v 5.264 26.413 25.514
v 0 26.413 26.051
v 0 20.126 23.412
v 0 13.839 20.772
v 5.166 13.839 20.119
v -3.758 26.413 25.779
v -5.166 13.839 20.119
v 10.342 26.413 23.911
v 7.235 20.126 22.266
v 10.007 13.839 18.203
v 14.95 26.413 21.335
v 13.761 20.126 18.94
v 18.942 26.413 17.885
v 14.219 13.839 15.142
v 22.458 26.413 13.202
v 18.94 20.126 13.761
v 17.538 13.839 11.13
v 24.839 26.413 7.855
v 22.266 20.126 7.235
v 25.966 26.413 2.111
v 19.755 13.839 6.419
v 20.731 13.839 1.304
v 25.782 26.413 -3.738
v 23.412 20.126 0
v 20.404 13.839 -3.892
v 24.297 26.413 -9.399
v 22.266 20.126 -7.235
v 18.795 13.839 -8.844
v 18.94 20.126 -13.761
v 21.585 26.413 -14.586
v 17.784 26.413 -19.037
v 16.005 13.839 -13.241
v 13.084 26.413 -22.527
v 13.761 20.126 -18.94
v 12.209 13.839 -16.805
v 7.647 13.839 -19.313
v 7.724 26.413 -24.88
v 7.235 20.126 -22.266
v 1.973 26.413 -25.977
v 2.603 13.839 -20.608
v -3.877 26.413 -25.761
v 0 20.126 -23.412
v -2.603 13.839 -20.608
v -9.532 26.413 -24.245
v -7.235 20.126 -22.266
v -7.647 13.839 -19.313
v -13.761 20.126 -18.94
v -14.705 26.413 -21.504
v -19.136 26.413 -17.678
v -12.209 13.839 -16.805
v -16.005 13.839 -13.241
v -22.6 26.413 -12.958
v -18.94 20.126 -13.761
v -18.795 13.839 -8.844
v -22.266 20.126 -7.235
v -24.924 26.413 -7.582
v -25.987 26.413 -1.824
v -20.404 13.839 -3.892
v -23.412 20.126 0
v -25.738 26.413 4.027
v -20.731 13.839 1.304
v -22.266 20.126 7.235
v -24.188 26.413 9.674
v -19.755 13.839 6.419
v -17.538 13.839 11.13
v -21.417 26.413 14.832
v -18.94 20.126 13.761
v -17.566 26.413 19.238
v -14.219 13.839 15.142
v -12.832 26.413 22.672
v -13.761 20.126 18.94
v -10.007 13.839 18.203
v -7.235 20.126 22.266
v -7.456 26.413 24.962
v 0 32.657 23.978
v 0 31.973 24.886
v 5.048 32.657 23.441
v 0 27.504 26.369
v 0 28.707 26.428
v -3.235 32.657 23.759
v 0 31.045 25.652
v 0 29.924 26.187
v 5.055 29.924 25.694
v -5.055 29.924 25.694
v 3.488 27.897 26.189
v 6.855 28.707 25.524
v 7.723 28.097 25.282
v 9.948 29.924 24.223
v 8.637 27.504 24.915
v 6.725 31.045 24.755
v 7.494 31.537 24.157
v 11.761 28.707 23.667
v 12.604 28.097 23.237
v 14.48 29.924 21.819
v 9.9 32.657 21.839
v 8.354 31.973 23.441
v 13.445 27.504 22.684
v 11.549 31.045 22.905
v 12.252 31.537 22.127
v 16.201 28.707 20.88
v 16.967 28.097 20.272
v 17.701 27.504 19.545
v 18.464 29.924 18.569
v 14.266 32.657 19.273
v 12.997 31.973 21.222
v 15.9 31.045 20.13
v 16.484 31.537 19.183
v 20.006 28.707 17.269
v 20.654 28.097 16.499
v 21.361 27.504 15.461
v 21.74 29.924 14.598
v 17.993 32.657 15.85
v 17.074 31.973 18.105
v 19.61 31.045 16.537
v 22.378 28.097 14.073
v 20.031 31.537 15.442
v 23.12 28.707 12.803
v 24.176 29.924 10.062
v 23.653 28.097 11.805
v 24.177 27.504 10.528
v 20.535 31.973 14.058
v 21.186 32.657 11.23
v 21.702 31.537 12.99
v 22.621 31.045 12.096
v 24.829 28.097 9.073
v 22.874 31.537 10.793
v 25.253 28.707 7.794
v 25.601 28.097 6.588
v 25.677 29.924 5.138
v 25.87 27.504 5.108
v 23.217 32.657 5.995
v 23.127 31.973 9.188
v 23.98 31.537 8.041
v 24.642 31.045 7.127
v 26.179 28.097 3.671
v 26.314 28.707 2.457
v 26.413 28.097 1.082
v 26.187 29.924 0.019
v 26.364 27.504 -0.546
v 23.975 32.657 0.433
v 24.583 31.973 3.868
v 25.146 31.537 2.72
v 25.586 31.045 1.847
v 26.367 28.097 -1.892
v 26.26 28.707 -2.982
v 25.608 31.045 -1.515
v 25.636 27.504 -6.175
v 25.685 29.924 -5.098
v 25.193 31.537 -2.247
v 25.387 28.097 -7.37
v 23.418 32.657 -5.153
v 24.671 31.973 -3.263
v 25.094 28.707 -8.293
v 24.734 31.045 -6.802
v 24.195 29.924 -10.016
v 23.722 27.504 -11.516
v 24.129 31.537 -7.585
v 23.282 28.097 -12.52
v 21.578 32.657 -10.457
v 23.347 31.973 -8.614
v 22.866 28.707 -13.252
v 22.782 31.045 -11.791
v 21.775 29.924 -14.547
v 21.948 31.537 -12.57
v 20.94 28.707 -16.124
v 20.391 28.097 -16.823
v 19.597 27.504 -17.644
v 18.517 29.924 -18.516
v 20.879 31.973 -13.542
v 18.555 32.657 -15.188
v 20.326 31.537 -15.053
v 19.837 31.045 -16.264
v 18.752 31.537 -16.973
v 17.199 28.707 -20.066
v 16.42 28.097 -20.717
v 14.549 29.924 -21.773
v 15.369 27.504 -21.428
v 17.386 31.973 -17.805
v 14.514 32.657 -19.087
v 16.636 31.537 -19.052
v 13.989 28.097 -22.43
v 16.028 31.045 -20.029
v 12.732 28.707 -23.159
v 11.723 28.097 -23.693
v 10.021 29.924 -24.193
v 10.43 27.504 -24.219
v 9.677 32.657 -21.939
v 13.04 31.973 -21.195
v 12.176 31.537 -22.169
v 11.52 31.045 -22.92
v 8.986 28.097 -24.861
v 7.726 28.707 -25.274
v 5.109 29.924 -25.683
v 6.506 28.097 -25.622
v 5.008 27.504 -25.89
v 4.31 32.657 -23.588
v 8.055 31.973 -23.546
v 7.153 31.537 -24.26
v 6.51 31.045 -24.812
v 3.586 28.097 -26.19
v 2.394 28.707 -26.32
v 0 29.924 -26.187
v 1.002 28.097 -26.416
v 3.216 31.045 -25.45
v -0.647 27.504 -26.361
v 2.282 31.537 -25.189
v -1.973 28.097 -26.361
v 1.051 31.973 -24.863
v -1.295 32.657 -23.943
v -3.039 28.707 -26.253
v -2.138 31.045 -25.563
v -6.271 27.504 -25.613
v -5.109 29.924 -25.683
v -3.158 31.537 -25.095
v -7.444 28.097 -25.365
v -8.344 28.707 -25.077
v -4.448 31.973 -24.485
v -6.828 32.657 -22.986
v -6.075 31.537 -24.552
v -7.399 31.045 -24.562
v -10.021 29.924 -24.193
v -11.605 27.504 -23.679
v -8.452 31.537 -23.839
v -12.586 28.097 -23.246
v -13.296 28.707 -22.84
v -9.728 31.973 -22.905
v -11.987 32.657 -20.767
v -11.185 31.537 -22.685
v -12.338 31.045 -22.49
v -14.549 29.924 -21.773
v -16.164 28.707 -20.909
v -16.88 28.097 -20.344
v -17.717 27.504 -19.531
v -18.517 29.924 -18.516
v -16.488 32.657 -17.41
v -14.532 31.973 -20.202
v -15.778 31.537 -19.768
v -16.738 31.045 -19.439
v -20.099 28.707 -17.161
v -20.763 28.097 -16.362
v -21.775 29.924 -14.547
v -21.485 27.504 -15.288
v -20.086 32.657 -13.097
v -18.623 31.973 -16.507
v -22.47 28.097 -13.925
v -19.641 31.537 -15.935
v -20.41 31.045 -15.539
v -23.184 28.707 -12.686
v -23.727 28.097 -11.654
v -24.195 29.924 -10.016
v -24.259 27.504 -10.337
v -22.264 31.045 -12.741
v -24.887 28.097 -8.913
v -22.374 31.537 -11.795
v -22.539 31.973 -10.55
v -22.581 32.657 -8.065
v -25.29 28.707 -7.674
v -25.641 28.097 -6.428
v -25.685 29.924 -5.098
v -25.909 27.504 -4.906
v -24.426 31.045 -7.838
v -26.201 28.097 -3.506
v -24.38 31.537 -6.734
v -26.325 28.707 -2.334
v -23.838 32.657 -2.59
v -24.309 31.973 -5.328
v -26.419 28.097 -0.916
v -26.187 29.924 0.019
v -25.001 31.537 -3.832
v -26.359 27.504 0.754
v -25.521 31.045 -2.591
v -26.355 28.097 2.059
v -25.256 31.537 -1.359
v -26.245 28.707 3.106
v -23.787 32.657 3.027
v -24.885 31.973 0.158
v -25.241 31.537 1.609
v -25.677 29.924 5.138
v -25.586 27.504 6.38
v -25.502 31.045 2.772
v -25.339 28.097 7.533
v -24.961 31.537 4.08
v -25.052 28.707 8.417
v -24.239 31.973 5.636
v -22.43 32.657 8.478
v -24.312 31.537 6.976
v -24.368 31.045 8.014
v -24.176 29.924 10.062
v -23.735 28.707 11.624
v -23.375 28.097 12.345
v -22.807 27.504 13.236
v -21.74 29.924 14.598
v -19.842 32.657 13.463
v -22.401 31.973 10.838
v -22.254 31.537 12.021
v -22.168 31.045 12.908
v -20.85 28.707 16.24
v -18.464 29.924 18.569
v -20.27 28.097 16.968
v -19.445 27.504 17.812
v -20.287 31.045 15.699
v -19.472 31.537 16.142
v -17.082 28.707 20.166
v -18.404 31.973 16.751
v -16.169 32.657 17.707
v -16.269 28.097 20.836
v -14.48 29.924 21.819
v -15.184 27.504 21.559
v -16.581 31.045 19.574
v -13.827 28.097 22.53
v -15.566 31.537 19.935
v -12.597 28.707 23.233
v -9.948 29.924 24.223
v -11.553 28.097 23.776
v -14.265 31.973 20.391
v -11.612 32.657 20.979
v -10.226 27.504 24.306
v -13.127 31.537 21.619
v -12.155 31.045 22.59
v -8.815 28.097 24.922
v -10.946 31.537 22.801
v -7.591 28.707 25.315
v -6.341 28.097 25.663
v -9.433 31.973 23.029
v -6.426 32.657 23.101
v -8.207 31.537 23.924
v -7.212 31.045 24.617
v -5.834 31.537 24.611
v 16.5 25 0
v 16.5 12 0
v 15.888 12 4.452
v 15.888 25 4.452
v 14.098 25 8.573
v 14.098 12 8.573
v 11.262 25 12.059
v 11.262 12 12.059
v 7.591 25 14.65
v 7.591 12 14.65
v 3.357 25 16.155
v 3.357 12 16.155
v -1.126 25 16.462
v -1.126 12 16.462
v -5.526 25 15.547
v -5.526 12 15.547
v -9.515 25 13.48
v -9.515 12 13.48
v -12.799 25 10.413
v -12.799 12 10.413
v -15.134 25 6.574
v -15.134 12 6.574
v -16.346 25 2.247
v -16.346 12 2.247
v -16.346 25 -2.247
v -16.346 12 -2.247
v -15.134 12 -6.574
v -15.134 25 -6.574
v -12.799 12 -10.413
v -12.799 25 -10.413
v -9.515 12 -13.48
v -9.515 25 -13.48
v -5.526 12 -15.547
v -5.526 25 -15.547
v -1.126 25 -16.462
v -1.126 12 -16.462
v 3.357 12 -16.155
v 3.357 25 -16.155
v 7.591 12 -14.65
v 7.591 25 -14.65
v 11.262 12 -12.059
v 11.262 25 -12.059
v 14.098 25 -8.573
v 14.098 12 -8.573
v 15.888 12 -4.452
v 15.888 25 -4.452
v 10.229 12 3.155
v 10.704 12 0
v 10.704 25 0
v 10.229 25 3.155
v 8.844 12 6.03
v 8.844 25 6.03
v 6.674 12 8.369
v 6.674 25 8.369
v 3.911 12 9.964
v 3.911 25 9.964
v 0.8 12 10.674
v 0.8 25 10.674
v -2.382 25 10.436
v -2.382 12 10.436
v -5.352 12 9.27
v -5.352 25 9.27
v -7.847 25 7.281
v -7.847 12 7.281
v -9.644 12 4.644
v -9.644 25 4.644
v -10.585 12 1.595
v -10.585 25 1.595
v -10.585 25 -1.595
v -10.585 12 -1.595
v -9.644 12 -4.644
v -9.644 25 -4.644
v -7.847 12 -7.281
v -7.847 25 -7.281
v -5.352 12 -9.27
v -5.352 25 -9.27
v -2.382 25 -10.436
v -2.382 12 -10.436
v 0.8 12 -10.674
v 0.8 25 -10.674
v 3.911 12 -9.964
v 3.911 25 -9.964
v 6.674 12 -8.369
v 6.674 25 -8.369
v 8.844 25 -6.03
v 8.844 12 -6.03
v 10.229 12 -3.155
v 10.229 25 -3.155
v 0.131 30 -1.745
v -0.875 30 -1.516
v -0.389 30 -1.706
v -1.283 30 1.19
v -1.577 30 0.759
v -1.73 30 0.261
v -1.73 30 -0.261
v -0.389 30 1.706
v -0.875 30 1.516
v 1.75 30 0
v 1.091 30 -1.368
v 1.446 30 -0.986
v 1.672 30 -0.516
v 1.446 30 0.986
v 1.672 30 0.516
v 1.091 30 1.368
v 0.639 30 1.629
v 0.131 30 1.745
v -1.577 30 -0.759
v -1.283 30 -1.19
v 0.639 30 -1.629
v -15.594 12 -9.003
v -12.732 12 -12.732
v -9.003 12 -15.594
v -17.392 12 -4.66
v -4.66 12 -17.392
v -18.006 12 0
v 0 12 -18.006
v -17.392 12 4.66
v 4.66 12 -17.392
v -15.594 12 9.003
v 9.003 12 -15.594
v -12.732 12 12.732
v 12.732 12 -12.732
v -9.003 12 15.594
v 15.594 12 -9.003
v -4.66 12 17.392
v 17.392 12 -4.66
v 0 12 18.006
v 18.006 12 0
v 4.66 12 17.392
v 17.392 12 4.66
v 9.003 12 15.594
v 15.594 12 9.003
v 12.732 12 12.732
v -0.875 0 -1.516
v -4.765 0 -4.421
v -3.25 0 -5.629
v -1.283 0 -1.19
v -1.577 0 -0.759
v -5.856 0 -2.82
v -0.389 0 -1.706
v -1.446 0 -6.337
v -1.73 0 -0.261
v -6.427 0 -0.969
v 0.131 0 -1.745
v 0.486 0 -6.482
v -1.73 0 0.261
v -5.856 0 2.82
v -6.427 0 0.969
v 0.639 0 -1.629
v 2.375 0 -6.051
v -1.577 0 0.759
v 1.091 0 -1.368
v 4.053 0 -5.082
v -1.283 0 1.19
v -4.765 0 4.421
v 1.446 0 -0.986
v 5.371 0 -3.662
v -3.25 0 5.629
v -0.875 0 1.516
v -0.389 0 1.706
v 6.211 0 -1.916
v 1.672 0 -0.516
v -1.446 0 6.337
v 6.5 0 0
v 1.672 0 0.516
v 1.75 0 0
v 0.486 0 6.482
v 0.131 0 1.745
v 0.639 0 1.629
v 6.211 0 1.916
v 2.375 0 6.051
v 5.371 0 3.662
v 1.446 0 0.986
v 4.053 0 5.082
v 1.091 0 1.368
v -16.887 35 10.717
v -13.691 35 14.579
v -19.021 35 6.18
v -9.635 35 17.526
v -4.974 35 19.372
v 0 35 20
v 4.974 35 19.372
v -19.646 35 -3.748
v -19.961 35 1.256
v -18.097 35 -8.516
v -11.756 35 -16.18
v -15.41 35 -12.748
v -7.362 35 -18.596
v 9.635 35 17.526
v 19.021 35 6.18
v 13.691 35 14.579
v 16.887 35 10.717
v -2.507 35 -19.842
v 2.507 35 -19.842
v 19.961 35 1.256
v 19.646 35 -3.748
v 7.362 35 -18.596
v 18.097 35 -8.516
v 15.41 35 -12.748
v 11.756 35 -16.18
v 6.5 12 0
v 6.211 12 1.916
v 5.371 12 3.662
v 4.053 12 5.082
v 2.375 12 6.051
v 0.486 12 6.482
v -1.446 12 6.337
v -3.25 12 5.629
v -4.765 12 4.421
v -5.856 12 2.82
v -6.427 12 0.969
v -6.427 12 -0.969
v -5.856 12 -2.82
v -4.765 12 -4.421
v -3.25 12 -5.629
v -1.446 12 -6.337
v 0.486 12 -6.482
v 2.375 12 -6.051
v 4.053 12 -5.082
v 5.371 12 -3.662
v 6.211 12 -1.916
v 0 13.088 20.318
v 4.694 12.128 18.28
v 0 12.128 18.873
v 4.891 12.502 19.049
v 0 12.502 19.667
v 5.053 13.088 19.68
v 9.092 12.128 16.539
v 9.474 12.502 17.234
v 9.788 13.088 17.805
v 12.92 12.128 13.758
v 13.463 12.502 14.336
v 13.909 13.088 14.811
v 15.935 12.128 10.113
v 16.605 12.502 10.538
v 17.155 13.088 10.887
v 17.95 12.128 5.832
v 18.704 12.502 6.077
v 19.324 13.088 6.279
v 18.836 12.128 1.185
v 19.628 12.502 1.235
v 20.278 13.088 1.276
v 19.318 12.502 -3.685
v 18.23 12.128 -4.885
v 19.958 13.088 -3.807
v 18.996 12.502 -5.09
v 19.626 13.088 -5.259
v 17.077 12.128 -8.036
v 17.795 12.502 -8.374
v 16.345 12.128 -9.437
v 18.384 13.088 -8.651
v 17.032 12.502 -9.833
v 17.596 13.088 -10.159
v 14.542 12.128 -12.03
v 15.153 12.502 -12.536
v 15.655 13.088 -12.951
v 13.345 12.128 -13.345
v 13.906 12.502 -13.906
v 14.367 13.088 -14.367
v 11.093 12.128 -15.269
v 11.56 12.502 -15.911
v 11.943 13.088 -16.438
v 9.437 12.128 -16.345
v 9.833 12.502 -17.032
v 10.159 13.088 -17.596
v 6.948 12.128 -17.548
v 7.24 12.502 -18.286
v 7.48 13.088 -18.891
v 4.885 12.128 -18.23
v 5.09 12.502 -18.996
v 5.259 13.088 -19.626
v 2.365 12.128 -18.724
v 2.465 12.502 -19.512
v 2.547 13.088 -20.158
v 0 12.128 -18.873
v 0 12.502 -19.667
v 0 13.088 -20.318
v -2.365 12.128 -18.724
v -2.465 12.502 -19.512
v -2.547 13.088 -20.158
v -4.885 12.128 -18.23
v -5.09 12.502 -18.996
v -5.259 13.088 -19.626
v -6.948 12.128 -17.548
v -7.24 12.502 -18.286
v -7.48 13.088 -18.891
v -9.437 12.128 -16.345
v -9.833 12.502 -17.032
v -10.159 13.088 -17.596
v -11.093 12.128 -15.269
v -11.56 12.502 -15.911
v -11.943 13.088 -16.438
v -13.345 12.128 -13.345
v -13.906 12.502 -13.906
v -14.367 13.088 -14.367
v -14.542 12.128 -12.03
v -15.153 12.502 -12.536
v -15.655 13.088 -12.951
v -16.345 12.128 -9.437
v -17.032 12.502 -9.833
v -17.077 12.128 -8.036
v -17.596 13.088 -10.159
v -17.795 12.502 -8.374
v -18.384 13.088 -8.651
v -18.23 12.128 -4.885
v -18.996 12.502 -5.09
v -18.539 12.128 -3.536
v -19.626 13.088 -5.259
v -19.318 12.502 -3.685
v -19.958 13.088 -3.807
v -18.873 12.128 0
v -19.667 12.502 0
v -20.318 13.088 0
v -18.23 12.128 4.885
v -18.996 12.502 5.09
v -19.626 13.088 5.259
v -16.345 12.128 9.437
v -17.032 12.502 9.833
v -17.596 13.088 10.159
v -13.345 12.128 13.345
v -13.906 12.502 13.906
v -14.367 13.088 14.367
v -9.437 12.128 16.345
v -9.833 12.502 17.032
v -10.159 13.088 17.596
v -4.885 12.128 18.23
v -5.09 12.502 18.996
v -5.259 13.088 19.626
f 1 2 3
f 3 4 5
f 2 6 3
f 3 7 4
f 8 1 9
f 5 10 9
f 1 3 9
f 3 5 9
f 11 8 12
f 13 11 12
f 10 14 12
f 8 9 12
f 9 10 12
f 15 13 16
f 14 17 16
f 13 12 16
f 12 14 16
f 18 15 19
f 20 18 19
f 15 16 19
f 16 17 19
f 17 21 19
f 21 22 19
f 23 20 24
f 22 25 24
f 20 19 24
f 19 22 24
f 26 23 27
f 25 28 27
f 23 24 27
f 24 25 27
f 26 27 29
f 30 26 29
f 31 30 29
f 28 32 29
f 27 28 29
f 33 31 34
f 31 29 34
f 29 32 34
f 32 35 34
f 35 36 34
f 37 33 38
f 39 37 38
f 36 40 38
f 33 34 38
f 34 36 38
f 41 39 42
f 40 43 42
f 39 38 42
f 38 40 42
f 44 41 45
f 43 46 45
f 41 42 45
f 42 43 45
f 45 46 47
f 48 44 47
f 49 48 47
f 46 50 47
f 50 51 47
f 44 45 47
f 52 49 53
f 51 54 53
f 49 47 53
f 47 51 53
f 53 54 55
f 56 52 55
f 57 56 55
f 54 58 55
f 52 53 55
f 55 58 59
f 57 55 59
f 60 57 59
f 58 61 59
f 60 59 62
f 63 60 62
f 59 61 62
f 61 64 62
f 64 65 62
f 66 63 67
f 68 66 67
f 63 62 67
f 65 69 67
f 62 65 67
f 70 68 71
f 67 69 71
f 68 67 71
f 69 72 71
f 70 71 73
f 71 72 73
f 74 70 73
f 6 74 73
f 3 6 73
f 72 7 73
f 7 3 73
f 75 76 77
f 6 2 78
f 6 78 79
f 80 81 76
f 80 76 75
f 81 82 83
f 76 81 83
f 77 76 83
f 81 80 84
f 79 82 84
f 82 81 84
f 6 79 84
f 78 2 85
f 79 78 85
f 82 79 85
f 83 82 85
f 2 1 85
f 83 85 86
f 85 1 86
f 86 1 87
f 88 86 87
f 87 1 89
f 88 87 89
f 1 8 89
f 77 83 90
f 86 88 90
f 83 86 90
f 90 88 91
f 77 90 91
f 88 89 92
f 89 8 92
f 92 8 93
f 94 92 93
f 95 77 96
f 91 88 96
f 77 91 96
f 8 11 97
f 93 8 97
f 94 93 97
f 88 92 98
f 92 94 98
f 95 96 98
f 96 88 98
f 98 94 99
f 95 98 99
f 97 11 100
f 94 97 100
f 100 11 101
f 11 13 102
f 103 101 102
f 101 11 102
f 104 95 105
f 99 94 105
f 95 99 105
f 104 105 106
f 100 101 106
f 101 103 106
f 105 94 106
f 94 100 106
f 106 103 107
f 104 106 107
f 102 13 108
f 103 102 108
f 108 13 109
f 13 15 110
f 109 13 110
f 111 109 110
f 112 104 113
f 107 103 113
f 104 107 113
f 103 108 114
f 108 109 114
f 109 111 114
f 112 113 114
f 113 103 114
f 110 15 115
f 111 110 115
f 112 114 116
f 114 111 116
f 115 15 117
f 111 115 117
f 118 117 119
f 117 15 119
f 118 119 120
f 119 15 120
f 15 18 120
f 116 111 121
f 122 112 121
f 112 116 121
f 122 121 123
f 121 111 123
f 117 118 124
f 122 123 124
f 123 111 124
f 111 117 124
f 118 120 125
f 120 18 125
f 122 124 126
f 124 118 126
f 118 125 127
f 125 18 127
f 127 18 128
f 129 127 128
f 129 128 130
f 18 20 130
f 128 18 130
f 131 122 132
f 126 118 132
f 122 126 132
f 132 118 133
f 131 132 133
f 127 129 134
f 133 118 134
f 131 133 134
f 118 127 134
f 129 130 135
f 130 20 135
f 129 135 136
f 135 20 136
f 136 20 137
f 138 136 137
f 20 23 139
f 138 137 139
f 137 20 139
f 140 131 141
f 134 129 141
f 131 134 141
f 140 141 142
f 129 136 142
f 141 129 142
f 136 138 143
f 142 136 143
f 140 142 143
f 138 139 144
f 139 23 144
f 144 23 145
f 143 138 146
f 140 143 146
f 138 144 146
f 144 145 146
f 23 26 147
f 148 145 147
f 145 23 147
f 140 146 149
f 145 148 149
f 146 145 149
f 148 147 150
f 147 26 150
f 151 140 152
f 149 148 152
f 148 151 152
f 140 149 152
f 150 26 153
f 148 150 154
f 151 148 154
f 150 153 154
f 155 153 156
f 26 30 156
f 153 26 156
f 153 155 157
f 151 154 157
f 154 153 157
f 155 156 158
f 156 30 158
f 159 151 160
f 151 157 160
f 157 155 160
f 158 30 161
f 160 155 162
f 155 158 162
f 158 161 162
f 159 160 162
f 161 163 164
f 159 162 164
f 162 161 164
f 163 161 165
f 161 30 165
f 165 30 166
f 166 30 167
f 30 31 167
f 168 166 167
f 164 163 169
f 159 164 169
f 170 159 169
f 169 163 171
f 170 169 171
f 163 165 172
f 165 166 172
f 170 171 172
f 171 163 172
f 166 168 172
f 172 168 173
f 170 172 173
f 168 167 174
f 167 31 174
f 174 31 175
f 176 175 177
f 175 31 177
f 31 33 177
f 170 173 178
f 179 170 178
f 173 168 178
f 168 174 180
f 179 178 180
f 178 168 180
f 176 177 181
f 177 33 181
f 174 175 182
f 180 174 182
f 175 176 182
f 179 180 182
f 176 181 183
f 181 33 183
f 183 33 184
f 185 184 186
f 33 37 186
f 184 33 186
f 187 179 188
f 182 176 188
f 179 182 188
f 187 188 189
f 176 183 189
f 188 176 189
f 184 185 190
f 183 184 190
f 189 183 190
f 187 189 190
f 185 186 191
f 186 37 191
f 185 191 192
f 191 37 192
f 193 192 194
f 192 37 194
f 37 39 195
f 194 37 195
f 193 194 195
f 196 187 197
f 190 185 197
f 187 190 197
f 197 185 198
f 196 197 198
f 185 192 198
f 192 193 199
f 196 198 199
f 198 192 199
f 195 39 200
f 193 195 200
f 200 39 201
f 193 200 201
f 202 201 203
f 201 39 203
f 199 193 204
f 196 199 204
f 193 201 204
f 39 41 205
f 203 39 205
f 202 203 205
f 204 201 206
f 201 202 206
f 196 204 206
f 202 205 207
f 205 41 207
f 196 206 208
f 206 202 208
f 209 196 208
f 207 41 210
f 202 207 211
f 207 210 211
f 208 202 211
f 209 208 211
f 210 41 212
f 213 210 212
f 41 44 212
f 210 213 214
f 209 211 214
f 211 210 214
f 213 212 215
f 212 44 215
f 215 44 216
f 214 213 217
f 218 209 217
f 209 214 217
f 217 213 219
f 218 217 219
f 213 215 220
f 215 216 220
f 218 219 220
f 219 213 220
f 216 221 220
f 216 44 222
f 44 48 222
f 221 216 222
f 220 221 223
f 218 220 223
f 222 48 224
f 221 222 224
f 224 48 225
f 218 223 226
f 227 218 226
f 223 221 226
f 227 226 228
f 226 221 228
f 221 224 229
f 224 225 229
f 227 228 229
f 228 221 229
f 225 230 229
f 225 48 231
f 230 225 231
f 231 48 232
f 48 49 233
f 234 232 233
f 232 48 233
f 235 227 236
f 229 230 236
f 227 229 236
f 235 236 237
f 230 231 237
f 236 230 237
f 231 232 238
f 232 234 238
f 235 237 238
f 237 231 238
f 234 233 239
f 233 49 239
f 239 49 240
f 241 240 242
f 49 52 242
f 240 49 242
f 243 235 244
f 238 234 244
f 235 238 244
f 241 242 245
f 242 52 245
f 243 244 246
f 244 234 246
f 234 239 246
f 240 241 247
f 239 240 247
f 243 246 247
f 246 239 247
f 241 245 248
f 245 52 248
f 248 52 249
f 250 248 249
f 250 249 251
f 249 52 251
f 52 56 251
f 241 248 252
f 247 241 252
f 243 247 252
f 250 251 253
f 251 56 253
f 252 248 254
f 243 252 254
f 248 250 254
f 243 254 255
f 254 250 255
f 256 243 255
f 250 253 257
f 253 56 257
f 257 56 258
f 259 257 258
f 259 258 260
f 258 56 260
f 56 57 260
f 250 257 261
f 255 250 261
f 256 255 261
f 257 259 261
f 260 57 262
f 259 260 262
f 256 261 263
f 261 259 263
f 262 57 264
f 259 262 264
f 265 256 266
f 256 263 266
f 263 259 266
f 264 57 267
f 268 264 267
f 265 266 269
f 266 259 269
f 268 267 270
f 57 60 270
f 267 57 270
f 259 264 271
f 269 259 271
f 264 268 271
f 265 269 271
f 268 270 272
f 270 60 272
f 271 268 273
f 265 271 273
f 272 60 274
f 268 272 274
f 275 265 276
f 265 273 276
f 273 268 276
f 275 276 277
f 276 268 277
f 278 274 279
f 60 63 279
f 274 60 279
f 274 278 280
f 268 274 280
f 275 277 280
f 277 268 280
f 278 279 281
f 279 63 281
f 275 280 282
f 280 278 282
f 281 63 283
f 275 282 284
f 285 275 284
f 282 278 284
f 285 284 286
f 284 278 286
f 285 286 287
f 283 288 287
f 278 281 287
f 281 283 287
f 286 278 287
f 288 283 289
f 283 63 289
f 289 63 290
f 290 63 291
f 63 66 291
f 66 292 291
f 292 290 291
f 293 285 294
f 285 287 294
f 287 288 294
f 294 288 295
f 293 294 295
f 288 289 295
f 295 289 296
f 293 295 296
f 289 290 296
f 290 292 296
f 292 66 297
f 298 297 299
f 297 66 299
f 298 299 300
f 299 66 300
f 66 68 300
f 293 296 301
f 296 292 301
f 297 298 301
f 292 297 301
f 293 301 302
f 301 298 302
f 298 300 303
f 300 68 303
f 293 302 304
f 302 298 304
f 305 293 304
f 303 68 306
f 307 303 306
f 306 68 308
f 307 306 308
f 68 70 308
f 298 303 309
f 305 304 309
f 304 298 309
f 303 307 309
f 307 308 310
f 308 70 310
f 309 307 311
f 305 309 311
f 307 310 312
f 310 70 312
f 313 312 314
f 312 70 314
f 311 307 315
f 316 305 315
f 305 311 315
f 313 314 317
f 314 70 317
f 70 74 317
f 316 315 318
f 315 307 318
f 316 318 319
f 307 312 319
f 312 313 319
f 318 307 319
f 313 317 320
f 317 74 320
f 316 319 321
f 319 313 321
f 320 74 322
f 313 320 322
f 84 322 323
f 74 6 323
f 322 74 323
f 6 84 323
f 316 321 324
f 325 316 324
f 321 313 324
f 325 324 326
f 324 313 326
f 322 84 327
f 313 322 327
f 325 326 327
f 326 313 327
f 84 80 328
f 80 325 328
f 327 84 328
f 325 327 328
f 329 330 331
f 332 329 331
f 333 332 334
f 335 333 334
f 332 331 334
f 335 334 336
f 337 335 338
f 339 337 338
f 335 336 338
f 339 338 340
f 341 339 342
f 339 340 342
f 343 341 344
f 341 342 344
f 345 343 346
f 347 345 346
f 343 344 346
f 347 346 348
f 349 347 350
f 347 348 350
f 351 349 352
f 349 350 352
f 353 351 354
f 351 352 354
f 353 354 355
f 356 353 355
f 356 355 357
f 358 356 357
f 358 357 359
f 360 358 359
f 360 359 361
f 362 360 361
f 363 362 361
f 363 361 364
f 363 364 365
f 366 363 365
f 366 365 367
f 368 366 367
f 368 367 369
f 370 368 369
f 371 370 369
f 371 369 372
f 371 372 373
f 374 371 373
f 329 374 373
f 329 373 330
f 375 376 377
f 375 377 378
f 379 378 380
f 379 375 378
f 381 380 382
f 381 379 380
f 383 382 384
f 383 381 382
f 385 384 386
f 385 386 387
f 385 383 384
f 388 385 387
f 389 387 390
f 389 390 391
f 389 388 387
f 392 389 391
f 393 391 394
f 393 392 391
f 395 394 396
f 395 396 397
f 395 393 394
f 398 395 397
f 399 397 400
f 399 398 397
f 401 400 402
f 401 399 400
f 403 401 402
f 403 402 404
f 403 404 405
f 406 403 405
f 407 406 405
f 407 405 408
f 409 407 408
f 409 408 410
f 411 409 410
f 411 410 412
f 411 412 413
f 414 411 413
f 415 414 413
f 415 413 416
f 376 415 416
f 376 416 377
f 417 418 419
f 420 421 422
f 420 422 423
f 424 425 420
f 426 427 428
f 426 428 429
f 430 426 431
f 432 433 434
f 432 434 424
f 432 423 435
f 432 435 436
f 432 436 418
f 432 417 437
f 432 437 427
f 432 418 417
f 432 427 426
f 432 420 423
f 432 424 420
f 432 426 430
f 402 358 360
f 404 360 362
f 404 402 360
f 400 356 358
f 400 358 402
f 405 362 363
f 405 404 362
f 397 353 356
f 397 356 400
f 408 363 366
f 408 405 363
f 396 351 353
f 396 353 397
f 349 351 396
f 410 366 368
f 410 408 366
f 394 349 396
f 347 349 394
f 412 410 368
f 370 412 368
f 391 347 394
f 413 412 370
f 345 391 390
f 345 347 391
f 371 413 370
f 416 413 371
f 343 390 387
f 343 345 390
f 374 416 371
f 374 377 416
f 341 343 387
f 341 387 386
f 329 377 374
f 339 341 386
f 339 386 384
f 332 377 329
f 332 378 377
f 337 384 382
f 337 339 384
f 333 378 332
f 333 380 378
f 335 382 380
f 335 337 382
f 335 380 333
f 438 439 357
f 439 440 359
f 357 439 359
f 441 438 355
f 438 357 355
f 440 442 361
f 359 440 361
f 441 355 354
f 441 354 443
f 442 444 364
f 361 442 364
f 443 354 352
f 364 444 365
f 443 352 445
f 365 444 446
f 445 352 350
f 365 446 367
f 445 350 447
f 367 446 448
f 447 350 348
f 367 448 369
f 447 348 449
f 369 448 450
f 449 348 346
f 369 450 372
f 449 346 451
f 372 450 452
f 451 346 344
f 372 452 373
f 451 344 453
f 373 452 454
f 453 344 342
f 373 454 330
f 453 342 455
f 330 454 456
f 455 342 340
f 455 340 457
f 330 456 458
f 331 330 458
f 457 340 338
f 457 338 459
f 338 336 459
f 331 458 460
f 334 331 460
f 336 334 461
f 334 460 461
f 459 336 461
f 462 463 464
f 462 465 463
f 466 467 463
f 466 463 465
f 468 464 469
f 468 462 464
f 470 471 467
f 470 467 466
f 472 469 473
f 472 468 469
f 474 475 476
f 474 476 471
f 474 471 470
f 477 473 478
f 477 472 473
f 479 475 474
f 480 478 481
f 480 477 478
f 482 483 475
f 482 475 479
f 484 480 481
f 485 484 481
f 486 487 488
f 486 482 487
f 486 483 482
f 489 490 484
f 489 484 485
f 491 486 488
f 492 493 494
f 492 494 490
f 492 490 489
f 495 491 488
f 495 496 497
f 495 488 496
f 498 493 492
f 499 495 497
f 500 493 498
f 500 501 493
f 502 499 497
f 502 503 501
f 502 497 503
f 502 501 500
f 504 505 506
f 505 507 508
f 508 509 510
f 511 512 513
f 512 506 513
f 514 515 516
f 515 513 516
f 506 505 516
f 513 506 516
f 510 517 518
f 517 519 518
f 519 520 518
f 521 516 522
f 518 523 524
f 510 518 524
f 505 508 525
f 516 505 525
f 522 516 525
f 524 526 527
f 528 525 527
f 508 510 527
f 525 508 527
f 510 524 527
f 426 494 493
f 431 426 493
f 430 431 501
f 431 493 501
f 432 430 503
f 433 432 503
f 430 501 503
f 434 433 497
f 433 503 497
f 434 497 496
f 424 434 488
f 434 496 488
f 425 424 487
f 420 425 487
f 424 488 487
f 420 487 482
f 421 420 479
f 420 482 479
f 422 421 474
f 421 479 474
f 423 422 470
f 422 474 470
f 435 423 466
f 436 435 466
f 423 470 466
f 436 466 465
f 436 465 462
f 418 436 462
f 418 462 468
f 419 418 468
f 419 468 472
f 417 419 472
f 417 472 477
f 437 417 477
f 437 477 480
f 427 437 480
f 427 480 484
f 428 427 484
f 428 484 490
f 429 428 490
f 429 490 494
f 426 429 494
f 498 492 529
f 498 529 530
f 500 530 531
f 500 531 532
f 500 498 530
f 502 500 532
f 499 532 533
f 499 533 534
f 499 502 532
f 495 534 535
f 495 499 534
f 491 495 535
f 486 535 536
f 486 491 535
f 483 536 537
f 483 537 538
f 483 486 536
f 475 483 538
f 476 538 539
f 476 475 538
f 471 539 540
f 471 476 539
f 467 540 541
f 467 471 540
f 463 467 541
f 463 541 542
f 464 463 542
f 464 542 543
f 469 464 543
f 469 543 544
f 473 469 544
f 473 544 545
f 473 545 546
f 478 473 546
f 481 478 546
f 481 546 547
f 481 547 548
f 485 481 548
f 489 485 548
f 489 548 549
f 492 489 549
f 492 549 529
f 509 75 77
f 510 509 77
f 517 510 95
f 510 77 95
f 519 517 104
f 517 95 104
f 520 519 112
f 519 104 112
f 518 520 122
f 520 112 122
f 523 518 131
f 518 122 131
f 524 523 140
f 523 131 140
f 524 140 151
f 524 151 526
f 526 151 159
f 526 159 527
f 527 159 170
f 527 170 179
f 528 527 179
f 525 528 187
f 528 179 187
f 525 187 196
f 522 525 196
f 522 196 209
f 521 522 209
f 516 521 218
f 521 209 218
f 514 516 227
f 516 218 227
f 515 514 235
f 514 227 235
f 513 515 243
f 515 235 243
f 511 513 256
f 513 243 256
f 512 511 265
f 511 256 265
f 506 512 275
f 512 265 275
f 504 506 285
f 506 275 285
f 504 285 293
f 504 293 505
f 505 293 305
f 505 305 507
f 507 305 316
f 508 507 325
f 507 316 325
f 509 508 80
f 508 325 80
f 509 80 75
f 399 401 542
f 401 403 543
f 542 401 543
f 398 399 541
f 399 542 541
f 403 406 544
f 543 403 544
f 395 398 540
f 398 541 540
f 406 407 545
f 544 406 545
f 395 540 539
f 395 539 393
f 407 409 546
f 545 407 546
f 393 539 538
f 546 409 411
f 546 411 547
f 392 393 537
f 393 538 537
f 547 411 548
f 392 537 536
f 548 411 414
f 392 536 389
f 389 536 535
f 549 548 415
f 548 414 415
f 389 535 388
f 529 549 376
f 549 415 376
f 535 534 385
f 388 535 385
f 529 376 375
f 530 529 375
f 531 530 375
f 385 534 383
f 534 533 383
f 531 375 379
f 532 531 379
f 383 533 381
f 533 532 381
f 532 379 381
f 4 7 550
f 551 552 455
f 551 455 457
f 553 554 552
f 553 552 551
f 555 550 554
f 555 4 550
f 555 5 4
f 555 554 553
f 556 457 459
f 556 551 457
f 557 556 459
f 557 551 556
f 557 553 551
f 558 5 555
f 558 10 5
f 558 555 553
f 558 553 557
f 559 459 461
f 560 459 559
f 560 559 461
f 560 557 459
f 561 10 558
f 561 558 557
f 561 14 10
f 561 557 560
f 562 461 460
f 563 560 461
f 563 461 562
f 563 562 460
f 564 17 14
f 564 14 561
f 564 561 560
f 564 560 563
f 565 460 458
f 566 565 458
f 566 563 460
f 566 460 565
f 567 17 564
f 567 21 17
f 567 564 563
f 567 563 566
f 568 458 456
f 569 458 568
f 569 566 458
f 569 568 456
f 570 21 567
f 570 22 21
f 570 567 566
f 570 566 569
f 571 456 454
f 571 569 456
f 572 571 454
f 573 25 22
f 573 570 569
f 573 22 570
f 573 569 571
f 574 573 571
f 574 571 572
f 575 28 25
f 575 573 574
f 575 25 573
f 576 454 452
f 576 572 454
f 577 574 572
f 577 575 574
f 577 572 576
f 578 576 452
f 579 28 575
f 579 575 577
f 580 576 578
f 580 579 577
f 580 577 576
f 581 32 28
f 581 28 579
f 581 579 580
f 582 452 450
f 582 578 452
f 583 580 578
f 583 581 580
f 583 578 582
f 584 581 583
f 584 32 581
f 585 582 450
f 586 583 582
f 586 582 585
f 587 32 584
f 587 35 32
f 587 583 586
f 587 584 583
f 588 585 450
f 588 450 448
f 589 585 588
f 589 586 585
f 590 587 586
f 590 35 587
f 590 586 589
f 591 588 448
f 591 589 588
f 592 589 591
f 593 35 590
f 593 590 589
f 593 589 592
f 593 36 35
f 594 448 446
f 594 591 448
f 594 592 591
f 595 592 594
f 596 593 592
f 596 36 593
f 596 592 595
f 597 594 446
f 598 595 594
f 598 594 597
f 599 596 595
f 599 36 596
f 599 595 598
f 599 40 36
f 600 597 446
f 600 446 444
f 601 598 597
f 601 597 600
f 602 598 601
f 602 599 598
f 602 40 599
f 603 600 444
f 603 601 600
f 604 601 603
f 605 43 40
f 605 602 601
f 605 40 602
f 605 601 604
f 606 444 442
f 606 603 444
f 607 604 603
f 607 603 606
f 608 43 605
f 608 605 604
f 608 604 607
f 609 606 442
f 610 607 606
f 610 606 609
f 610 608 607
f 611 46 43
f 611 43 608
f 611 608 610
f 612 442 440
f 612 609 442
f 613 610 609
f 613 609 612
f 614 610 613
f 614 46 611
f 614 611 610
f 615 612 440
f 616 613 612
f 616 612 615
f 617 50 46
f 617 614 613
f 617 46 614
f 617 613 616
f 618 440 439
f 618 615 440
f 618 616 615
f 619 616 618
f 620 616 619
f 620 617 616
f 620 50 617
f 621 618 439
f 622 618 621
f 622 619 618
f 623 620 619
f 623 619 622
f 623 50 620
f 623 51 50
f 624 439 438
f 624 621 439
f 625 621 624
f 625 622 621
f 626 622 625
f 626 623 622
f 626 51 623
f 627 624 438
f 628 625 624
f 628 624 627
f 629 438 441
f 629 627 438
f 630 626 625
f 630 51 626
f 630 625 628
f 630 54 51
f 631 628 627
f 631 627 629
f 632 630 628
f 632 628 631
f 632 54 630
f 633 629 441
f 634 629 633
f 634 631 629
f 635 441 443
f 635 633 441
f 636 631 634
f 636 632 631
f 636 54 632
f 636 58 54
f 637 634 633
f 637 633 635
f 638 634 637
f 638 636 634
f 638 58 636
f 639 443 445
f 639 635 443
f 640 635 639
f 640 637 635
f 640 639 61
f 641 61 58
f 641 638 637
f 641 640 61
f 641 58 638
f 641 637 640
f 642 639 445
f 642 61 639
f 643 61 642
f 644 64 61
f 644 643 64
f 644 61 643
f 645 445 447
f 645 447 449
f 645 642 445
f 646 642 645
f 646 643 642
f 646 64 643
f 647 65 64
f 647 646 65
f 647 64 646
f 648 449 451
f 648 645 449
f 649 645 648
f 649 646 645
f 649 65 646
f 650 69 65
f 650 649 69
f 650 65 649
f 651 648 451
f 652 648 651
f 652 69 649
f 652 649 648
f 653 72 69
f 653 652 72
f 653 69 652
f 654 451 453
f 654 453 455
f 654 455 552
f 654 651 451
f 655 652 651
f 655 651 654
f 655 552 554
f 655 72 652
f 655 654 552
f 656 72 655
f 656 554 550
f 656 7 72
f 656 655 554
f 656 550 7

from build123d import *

# Parameters (mm, degrees)
F0_R     = 6.5
F0_R_2   = 1.75
F3_DEPTH = 20
F4_DEPTH = 30
F5_R     = 3
F6_R     = 5
F7_R     = 16.5
F7_R_2   = 10.70440387
F8_DEPTH = 25


with BuildPart() as f2:
    # F1 (on Right) → F2 (revolve)
    with BuildSketch(Plane.YZ):
        Polygon((12, 20), (12, 0), (35, 0), (35, 20), (30.4406098954, 27.7423450379), align=None)
    revolve(axis=Axis((0, 35.946440883, 0), (0, 1, 0)))

    # F0 (on Front) → F3 (join)
    with BuildSketch(Plane.XZ):
        Circle(F0_R)
        Circle(F0_R_2, mode=Mode.SUBTRACT)
    extrude(amount=-F3_DEPTH)

    # F0 (on Front) → F4 (cut)
    with BuildSketch(Plane.XZ):
        Circle(F0_R_2)
    extrude(amount=-F4_DEPTH, mode=Mode.SUBTRACT)

    # F5
    f5_edges = [f2.edges().sort_by_distance(p)[0] for p in [
        (0, 12, -20),
    ]]
    fillet(f5_edges, radius=F5_R)

    # F6
    f6_edges = [f2.edges().sort_by_distance(p)[0] for p in [
        (0, 30.44061, -27.742345),
    ]]
    fillet(f6_edges, radius=F6_R)

    # F7 (on Front) → F8 (cut)
    with BuildSketch(Plane.XZ):
        Circle(F7_R)
        Circle(F7_R_2, mode=Mode.SUBTRACT)
    extrude(amount=-F8_DEPTH, mode=Mode.SUBTRACT)


solid = f2.part
